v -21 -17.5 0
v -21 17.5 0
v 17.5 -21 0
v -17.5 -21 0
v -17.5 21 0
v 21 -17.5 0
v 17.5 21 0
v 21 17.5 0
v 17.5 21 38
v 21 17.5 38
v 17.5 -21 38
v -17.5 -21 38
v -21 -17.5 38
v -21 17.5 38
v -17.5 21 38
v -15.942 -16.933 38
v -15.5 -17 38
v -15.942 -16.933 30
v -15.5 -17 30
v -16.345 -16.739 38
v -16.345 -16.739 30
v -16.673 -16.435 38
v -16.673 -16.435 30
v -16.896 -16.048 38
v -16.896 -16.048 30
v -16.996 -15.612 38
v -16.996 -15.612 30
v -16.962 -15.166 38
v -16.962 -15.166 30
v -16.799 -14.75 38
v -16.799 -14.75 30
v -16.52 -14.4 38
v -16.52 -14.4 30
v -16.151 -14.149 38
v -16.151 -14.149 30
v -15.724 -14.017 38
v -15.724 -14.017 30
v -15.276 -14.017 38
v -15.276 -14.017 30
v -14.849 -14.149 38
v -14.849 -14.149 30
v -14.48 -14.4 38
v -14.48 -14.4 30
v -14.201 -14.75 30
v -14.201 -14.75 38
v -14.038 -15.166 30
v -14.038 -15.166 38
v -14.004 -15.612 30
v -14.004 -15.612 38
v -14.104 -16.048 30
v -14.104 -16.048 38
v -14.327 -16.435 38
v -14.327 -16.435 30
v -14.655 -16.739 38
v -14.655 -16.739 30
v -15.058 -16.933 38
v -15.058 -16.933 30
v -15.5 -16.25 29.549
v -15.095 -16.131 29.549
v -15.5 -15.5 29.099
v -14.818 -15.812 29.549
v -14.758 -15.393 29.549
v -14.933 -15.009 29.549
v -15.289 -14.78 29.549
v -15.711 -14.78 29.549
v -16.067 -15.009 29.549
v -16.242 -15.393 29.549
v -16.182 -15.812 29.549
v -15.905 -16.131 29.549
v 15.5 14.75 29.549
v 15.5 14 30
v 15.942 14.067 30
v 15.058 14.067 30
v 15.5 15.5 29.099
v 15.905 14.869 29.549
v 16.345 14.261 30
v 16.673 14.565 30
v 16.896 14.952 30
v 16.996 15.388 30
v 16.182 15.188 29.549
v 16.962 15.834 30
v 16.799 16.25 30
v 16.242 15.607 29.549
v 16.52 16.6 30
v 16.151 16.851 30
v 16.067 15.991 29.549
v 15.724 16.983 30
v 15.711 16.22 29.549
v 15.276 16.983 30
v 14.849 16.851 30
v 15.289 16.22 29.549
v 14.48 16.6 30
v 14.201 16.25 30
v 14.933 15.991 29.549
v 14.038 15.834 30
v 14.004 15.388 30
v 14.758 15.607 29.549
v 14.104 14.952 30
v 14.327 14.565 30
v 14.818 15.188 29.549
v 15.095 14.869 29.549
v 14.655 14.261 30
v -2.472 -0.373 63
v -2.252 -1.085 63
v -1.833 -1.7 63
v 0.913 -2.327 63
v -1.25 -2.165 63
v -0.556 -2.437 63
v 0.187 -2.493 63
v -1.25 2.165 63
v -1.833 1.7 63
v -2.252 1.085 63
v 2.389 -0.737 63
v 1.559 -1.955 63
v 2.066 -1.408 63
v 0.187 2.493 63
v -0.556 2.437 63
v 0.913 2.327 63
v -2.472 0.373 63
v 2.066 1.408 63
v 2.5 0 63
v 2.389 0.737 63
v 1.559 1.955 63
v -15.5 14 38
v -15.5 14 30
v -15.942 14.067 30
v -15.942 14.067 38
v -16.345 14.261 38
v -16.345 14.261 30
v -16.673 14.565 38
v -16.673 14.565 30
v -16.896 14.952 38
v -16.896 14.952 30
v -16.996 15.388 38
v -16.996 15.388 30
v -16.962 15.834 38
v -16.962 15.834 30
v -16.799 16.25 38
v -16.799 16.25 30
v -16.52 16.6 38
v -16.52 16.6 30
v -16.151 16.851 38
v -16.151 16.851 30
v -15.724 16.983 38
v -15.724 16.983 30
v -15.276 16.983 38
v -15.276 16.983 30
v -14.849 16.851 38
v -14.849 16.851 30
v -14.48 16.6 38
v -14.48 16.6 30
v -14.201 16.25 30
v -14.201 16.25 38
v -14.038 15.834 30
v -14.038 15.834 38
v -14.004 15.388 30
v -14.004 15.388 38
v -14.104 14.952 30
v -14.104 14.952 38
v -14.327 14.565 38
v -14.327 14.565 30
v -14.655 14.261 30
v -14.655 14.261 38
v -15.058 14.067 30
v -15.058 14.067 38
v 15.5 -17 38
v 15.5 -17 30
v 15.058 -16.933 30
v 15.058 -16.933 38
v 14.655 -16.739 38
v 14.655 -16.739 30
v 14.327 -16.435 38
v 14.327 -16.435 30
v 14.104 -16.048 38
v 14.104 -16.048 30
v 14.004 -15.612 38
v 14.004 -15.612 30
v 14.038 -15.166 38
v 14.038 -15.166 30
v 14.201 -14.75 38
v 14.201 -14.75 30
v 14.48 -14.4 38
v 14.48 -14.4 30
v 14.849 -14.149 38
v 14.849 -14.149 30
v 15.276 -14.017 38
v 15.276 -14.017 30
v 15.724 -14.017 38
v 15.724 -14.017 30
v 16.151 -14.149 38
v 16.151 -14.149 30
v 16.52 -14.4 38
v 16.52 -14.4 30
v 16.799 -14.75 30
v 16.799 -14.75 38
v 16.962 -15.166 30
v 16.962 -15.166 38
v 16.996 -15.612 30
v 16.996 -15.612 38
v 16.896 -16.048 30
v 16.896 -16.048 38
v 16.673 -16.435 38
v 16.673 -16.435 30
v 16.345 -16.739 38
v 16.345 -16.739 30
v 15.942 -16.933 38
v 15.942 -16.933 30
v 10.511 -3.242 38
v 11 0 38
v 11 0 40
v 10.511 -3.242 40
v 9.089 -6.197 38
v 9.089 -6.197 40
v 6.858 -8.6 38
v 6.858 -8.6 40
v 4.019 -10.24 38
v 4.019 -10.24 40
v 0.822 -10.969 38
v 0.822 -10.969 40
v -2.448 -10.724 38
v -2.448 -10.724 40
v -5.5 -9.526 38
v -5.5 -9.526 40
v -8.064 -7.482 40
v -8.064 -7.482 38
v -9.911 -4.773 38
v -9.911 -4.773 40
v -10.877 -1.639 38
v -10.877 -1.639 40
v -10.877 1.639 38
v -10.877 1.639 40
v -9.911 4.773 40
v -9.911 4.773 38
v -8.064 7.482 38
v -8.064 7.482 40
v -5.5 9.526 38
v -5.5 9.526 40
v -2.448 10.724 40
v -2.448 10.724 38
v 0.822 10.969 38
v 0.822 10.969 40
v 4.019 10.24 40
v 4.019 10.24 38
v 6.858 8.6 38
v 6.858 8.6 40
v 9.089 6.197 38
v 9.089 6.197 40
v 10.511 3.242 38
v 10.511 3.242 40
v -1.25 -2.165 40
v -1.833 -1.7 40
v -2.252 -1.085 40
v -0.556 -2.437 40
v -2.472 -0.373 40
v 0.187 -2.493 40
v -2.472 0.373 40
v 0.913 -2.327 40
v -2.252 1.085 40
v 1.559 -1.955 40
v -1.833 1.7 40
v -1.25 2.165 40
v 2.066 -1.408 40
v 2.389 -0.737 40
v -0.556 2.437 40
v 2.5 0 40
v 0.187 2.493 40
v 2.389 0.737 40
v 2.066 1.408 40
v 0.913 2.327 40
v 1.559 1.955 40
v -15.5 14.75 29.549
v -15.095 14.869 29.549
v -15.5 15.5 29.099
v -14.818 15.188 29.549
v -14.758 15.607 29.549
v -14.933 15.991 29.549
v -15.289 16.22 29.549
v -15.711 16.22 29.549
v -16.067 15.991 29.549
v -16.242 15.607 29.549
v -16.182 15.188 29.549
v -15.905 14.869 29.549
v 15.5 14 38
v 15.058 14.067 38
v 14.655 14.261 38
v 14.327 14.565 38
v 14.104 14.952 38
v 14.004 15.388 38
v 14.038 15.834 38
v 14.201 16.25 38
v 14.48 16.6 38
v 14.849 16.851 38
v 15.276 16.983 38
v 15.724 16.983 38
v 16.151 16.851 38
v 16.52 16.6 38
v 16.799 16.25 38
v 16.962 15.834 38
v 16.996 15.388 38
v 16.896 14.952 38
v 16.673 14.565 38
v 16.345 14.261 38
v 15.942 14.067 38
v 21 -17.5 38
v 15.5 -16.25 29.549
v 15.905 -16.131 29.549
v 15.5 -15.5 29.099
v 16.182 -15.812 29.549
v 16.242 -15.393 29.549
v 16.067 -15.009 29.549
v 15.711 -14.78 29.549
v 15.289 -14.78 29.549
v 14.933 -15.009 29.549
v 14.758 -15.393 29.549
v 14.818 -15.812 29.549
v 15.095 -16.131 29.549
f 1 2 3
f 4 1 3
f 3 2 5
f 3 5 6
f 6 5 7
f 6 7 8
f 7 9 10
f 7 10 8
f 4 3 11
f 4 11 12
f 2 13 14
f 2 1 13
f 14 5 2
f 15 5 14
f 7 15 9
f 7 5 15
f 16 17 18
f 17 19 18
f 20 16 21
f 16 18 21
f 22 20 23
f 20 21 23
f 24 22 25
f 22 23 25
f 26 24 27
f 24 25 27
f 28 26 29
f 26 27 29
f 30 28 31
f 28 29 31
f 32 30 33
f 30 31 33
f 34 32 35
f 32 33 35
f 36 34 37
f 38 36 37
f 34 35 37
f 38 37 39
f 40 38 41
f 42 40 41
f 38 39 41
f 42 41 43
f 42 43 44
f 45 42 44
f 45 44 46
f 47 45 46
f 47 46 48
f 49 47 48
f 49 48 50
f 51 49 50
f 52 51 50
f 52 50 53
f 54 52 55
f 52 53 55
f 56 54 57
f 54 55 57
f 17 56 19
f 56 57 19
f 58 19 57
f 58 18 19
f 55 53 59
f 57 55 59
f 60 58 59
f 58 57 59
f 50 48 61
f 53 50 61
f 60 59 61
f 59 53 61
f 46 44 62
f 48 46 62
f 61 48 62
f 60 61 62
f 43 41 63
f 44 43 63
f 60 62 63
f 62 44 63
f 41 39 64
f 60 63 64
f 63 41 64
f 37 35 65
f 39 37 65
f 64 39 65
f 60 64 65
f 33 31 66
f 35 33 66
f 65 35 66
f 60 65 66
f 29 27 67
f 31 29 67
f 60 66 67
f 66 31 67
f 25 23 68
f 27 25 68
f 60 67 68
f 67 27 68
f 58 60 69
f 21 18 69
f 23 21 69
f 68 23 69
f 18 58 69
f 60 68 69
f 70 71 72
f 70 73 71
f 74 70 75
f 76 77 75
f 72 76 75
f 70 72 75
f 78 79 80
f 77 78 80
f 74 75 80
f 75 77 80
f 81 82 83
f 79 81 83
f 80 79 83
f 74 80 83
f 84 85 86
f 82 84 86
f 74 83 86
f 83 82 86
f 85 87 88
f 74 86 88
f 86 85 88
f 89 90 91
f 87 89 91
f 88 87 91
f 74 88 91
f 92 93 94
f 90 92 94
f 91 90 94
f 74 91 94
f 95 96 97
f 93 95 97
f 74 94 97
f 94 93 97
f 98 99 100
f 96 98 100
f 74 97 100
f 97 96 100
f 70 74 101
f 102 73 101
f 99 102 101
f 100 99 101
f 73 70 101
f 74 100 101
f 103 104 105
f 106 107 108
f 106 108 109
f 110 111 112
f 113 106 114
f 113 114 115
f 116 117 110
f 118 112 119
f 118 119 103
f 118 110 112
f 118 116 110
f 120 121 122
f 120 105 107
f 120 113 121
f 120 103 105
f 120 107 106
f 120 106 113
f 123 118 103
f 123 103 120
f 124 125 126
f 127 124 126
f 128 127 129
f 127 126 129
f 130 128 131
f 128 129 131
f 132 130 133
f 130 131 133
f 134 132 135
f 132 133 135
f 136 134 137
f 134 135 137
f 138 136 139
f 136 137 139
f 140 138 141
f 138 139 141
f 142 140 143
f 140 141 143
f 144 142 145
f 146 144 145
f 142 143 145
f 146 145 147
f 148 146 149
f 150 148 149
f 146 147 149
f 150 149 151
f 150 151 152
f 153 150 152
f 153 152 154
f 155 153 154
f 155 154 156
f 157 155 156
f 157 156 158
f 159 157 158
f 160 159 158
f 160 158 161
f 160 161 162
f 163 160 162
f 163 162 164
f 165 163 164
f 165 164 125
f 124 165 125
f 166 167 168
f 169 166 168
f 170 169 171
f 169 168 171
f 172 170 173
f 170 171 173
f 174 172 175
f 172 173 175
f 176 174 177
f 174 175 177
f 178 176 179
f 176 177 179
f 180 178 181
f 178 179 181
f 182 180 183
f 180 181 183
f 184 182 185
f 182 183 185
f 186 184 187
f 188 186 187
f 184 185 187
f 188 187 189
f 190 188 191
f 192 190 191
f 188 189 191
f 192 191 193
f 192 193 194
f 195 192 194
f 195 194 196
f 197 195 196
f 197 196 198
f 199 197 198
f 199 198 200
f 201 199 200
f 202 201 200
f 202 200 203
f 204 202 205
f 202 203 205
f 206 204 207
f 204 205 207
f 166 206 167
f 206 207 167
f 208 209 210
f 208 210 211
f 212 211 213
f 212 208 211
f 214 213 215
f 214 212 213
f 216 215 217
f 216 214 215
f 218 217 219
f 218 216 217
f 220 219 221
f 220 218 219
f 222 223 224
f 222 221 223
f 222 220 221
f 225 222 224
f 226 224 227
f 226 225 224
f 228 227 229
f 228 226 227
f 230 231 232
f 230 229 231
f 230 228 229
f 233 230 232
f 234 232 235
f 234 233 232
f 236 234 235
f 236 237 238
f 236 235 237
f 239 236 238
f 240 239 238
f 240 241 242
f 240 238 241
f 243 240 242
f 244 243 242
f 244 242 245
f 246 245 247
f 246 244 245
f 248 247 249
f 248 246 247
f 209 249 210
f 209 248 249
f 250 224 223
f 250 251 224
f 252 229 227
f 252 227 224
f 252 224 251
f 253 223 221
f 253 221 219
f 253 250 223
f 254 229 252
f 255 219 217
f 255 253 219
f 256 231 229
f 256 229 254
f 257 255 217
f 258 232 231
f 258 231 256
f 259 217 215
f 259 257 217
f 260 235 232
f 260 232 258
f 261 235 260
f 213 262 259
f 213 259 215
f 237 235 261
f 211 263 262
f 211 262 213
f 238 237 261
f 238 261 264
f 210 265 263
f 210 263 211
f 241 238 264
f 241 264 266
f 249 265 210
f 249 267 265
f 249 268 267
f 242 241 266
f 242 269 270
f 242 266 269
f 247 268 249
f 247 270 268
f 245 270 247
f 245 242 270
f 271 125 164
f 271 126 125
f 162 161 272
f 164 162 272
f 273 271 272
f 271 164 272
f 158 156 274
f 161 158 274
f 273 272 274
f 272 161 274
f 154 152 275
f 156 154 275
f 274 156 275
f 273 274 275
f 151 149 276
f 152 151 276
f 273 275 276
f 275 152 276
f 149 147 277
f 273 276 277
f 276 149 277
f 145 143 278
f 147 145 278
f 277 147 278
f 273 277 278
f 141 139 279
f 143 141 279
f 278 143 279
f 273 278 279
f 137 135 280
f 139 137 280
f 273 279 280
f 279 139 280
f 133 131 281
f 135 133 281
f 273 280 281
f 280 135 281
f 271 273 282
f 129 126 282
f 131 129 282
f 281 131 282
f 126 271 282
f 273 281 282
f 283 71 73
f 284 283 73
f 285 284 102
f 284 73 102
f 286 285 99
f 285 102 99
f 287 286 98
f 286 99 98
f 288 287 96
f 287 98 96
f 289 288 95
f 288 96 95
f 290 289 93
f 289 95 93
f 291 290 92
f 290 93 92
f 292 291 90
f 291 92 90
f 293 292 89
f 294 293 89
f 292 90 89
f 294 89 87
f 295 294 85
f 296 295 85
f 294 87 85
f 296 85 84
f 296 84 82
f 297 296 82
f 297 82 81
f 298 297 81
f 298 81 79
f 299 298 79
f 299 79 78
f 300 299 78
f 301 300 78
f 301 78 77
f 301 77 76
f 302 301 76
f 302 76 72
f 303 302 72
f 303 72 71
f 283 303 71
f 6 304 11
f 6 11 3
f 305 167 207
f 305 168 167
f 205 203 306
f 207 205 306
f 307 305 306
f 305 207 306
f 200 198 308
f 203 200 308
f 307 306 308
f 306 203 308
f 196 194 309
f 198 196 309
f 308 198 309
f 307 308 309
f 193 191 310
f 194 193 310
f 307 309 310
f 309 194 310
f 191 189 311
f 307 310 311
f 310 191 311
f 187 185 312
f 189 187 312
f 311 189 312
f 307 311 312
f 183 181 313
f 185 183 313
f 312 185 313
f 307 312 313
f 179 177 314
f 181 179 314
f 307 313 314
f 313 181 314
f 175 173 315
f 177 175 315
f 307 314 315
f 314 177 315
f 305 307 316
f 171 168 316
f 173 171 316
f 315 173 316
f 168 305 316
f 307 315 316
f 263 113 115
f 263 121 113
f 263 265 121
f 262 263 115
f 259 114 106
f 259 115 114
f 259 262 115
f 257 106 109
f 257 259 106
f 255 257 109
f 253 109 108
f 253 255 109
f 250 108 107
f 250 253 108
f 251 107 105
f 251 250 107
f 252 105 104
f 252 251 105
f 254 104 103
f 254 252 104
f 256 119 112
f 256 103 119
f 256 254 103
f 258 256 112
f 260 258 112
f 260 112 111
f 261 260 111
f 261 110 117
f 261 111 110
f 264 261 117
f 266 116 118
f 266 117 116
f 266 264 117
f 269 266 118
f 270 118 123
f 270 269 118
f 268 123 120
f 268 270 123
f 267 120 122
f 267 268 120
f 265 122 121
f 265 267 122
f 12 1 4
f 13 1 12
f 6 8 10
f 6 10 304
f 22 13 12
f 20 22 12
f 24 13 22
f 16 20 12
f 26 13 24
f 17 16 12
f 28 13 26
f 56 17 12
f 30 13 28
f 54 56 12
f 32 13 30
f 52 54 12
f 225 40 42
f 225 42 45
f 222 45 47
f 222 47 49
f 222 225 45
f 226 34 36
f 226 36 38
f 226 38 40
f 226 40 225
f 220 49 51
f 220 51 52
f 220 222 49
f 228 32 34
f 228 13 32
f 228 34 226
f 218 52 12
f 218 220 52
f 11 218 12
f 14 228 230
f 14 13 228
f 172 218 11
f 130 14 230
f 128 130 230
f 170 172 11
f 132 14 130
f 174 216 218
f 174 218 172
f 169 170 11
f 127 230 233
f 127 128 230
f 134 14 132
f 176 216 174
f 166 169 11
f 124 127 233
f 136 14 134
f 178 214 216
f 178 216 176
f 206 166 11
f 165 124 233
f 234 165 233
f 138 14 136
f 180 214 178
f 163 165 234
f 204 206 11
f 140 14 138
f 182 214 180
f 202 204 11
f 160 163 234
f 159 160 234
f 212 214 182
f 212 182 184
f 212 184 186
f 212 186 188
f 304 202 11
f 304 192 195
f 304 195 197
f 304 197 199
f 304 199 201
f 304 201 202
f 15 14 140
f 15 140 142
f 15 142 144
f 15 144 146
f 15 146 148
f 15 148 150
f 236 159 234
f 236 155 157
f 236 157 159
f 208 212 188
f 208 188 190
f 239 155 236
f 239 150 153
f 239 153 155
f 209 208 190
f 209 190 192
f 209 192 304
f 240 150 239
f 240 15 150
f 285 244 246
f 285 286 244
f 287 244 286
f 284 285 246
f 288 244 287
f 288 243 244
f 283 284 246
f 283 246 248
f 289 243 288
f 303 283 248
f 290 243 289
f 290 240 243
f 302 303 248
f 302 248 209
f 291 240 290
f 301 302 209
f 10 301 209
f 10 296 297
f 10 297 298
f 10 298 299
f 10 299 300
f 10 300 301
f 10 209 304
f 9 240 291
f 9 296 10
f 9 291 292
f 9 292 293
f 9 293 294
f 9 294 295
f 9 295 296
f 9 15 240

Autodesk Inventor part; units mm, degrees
ref_plane "YZ Plane" through (0, 0, 0) normal (1, 0, 0) x (0, 1, 0)
ref_plane "XZ Plane" through (0, 0, 0) normal (0, 1, 0) x (-1, 0, 0)
ref_plane "XY Plane" through (0, 0, 0) normal (0, 0, 1) x (1, 0, 0)
sketch "Sketch1" plane through (0, 0, 0) normal (0, 0, 1) x (1, 0, 0)
  line L0 (21, -21) -> (-21, -21)
  line L1 (-21, -21) -> (-21, 21)
  line L2 (-21, 21) -> (21, 21)
  line L3 (21, 21) -> (21, -21)
  line L4 (21, -21) -> (-21, 21) construction
  line L5 (-21, -21) -> (21, 21) construction
  point P0 (0, 0)
  dimension "d0" = 42
extrude "Extrusion1" add sketch "Sketch1" along normal blind 38
sketch "Sketch2" plane through (0, 0, 38) normal (0, 0, 1) x (1, 0, 0)
  point P0 (0, 0)
  point P1 (-15.5, 15.5)
  point P2 (-15.5, -15.5)
  point P3 (15.5, -15.5)
  point P4 (15.5, 15.5)
  dimension "d3" = 31
  dimension "d4" = 31
  dimension "d5" = 15.5
  dimension "d6" = 15.5
hole "Hole1" at (-15.5, 15.5, 38) at (-15.5, -15.5, 38) at (15.5, -15.5, 38) at (15.5, 15.5, 38) direction (0, 0, -1) diameter 3 depth 8 tip angle 118
chamfer "Chamfer1" distance 3.5 angle 45 4 edges at (21, 21, 19) (21, -21, 19) (-21, 21, 19) (-21, -21, 19)
sketch "Sketch3" plane through (0, 0, 38) normal (0, 0, 1) x (1, 0, 0)
  circle A0 centre (0, 0) radius 11
  dimension "d17" = 22
extrude "Extrusion2" add sketch "Sketch3" along normal blind 2
sketch "Sketch4" plane through (0, 0, 40) normal (0, 0, 1) x (1, 0, 0)
  circle A0 centre (0, 0) radius 11 projected
  circle A1 centre (0, 0) radius 2.5
  dimension "d20" = 5
extrude "Extrusion3" add sketch "Sketch4" along normal blind 23 contours A1
equation "\"d4\" = d3"
equation "\"d5\" = 0.5 * d3"
equation "\"d6\" = 0.5 * d3"
properties part number "Z Axis Motor (Stepper)" material "Steel, Alloy"
